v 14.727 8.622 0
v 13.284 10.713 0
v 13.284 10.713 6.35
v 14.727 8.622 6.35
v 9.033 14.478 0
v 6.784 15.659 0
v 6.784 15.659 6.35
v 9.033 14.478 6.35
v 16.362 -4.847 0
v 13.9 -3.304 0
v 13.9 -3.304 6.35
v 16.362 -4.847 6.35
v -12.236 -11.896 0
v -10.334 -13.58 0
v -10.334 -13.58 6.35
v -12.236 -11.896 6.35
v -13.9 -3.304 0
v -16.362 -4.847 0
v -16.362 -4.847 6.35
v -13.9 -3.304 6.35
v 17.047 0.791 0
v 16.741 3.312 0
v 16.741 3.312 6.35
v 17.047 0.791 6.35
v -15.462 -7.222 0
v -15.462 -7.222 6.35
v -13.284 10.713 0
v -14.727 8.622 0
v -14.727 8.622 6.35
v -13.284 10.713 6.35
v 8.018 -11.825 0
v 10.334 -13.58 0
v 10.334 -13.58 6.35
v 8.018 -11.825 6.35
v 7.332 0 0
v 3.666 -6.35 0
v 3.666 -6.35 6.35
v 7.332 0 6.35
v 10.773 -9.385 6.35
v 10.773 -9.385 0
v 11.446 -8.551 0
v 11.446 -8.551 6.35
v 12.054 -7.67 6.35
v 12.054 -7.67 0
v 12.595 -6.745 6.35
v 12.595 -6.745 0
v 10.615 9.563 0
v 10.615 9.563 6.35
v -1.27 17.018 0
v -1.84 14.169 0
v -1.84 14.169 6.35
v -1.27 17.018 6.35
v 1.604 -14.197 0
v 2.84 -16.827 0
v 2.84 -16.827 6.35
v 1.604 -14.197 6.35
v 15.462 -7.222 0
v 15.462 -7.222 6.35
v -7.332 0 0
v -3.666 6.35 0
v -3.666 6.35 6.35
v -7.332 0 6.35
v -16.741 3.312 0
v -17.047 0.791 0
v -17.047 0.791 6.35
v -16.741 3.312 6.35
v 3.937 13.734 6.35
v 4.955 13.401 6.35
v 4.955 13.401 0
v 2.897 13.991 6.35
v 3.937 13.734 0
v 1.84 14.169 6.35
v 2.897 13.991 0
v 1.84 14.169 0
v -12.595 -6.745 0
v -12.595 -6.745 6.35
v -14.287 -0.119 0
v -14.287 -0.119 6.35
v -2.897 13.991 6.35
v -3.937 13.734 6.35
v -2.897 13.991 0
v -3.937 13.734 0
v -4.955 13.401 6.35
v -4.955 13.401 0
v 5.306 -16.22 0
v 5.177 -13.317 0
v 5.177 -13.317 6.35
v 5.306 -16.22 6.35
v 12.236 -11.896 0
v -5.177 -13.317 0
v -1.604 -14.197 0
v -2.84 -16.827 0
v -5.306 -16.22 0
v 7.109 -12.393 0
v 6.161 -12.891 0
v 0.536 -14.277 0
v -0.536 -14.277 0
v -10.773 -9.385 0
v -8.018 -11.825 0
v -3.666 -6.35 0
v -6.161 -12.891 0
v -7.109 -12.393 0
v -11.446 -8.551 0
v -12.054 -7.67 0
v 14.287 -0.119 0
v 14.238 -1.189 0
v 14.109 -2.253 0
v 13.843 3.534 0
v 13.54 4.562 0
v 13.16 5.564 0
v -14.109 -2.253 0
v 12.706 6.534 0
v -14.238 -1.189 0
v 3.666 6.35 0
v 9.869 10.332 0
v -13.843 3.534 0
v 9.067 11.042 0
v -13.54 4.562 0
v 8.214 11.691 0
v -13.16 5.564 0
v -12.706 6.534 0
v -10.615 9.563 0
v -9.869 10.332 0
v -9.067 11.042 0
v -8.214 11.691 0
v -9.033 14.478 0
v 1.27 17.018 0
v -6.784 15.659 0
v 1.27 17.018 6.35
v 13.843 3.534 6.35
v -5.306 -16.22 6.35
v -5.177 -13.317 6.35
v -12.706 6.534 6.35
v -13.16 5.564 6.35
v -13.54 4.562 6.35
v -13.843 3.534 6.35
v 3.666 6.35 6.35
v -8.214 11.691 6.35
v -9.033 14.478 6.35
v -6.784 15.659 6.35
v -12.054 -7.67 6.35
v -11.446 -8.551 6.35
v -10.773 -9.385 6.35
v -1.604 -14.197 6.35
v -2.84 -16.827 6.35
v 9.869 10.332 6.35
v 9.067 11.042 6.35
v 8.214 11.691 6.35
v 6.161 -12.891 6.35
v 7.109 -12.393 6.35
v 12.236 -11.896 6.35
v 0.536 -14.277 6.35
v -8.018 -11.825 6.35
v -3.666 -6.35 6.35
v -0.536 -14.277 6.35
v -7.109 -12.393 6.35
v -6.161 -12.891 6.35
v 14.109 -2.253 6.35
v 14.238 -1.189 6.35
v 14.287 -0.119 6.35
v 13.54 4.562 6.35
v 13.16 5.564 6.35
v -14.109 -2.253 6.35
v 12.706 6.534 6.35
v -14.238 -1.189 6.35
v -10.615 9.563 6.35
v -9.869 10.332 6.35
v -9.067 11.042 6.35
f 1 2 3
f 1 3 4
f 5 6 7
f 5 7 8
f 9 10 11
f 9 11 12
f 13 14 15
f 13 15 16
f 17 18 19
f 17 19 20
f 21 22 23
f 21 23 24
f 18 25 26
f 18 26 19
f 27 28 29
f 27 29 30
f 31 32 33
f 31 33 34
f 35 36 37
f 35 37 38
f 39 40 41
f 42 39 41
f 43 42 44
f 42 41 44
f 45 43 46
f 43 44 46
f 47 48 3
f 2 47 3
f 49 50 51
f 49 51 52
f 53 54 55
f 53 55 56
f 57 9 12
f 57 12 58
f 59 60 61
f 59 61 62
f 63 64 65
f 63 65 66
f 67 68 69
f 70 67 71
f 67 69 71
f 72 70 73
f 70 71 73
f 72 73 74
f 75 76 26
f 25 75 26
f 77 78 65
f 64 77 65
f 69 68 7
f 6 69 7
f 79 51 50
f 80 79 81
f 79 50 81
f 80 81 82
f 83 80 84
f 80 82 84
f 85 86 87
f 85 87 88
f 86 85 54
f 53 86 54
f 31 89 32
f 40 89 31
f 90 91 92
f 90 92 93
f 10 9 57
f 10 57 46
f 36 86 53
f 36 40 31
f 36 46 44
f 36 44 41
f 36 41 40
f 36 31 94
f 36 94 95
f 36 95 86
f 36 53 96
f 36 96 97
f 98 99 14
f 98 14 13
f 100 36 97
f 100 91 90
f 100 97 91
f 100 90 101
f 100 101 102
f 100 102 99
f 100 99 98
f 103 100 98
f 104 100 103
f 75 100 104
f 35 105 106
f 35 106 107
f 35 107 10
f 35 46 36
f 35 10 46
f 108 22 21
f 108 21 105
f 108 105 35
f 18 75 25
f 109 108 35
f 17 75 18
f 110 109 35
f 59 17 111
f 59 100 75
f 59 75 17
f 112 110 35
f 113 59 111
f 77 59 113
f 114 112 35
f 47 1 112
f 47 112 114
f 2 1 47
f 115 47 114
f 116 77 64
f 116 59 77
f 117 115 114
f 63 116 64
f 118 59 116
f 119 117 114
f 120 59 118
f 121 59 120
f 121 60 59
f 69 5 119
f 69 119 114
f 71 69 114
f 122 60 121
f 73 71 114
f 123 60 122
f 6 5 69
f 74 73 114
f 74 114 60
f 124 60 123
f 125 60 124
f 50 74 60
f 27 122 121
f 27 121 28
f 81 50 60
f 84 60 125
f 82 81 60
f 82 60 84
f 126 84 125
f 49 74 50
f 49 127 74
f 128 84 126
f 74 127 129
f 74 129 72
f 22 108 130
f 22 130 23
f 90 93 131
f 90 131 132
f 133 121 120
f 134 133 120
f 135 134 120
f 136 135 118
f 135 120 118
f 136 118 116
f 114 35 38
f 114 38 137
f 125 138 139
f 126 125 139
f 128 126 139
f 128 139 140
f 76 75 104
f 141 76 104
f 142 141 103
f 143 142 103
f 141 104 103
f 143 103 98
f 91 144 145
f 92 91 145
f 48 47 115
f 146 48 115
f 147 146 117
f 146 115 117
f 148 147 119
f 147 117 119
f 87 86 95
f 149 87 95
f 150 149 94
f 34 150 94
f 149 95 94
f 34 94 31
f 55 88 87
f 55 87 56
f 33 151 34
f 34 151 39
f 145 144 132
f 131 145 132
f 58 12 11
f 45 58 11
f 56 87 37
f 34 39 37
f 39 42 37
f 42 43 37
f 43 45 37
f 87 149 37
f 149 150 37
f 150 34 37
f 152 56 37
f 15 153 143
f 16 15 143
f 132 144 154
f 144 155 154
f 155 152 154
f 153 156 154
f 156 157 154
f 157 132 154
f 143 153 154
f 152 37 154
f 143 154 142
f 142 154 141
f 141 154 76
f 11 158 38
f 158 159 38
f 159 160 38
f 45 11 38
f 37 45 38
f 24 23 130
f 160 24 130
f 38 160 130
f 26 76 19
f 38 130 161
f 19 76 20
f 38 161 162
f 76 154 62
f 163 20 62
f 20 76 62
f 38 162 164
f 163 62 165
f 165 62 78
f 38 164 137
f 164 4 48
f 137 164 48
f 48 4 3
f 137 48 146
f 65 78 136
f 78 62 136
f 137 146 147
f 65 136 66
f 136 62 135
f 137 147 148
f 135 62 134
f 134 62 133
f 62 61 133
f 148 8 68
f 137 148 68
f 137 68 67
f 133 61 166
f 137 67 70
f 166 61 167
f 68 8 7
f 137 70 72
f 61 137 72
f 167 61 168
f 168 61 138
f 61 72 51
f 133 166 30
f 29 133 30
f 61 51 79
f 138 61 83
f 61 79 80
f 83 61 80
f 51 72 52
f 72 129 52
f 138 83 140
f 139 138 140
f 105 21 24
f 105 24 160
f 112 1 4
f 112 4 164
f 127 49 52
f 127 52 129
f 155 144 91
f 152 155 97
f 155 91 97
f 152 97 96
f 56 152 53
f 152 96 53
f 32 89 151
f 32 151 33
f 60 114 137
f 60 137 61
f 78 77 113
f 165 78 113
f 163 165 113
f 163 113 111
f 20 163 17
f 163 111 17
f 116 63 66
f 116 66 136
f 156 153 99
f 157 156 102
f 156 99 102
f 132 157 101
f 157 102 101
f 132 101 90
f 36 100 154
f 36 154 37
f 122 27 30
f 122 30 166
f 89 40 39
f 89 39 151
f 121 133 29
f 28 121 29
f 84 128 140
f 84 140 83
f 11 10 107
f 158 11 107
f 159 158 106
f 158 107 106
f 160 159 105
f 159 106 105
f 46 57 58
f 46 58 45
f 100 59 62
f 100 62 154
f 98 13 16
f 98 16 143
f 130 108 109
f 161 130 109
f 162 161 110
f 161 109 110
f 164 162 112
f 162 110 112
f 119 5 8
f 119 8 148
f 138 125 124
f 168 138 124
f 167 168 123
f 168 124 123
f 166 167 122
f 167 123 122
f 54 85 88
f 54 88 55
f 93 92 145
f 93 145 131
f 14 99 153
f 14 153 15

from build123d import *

# Parameters (mm, degrees)
SKETCH1_R           = 14.2875
BOSS_EXTRUDE1_DEPTH = 6.35
BOSS_EXTRUDE2_DEPTH = 6.35
CIRPATTERN1_COUNT   = 13


with BuildPart() as part:
    # Sketch1 → Boss-Extrude1 (new body)
    with BuildSketch(Plane.XY):
        Circle(SKETCH1_R)
        Polygon((7.332348419, 0), (3.666174209, 6.35), (-3.666174209, 6.35), (-7.332348419, 0), (-3.666174209, -6.35), (3.666174209, -6.35), align=None, mode=Mode.SUBTRACT)
    extrude(amount=BOSS_EXTRUDE1_DEPTH)

    # Sketch2 → Boss-Extrude2 (add)
    with BuildSketch(Plane.XY):
        Polygon((-1.27, 17.018), (1.27, 17.018), (1.905, 13.843), (-1.905, 13.843), align=None)
    boss_extrude2 = extrude(amount=BOSS_EXTRUDE2_DEPTH)

    # CirPattern1: Boss-Extrude2 ×13 about axis
    cirpattern1_axis = Axis((0, 0, 0), (0, 0, 1))
    for i in range(1, CIRPATTERN1_COUNT):
        add(boss_extrude2.rotate(cirpattern1_axis, i * 360 / CIRPATTERN1_COUNT))


solid = part.part
